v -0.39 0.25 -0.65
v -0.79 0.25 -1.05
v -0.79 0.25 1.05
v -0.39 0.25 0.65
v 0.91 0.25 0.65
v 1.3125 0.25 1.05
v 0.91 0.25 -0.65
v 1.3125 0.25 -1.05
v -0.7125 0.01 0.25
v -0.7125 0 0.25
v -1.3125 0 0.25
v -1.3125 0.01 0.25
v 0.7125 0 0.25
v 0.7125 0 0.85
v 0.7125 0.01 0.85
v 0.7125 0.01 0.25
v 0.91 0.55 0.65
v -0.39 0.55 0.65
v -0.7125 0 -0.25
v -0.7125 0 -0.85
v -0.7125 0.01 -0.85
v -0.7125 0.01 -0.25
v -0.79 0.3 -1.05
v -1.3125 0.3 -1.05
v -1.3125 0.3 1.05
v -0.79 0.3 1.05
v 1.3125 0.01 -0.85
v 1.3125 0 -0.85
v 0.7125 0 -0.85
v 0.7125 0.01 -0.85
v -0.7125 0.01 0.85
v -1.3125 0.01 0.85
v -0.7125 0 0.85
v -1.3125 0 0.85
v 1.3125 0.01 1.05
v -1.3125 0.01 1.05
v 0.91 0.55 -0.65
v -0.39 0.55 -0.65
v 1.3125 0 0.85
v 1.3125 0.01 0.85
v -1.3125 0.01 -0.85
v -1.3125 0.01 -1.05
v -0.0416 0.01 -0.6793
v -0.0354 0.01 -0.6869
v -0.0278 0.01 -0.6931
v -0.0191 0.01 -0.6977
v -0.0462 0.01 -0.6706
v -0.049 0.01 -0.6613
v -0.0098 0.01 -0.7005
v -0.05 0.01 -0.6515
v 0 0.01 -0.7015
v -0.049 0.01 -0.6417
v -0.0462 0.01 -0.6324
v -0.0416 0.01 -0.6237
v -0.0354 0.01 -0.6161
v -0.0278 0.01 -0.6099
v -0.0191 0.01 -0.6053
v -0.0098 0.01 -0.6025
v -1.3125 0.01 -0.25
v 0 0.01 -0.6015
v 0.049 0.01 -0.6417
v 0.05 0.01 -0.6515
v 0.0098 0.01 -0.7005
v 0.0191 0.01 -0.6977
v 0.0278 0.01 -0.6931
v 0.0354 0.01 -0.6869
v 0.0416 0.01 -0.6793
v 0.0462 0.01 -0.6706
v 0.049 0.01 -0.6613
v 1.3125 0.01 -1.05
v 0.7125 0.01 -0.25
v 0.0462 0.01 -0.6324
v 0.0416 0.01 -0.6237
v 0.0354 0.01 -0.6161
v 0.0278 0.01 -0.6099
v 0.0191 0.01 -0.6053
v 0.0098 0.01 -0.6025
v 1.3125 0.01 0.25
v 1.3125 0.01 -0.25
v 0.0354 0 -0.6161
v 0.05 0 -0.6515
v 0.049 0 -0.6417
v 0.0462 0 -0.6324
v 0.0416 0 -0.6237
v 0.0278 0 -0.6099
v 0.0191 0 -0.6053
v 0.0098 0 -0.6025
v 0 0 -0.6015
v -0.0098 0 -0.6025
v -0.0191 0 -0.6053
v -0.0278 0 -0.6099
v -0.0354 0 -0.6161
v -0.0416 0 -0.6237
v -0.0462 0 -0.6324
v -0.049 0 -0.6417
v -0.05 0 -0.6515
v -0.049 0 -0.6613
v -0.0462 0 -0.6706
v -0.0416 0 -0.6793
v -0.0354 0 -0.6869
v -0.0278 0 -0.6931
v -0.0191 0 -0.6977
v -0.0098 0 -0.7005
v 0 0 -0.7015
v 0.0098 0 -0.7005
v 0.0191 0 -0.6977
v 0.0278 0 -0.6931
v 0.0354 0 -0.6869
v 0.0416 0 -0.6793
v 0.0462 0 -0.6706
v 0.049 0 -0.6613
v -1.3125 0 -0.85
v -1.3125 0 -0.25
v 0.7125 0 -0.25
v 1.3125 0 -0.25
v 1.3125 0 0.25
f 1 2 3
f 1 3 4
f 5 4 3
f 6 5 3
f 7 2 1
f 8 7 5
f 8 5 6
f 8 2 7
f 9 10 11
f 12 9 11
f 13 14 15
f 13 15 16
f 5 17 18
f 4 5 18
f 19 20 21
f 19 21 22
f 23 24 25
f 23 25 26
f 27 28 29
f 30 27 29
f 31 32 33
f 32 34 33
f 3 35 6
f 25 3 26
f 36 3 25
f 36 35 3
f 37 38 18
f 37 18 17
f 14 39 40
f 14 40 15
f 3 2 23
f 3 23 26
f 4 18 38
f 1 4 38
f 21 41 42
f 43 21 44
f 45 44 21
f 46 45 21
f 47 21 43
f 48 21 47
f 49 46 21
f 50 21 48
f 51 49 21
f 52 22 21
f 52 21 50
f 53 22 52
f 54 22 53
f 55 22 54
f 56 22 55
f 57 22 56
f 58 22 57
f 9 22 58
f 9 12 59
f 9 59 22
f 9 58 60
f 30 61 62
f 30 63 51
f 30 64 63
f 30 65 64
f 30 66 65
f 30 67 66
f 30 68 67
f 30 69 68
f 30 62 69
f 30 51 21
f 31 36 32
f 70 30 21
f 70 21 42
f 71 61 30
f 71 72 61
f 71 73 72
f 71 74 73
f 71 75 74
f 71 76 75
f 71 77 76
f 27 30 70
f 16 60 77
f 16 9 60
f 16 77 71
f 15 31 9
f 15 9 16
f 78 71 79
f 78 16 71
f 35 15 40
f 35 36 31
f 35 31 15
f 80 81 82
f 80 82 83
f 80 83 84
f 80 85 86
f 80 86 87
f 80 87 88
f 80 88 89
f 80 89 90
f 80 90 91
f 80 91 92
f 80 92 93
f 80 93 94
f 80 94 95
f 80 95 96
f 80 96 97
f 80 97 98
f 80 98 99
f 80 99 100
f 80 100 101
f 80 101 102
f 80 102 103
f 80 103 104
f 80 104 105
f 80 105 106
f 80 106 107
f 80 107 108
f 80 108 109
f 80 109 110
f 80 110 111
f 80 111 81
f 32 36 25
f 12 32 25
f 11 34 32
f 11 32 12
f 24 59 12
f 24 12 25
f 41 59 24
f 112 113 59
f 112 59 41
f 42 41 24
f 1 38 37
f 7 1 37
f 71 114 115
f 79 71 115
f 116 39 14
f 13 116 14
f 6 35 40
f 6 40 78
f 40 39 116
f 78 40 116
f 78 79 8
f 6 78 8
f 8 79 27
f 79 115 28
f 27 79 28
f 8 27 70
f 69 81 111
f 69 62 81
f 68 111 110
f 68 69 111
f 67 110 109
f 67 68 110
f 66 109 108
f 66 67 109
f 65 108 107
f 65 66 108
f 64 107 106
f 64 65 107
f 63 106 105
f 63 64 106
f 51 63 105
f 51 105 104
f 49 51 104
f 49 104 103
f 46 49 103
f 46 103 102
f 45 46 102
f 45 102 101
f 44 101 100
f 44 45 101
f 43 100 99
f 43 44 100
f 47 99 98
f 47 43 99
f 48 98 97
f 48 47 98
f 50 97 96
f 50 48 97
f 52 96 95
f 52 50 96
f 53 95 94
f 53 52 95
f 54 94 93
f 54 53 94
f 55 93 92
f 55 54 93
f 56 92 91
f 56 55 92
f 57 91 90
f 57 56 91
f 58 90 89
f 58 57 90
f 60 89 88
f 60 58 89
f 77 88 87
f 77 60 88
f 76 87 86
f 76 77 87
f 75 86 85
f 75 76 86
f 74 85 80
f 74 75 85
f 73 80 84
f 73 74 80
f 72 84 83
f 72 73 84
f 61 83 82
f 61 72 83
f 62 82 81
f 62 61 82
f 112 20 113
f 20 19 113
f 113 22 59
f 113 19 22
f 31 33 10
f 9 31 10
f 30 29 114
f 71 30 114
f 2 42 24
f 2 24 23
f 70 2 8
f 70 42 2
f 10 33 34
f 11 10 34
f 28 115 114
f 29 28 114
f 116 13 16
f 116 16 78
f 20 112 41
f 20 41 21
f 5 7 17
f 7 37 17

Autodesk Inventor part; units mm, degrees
ref_plane "YZ Plane" through (0, 0, 0) normal (1, 0, 0) x (0, 1, 0)
ref_plane "XZ Plane" through (0, 0, 0) normal (0, 1, 0) x (-1, 0, 0)
ref_plane "XY Plane" through (0, 0, 0) normal (0, 0, 1) x (1, 0, 0)
sketch "Sketch1" plane through (0, 0, 0) normal (0, 1, 0) x (-1, 0, 0)
  line L0 (1.3125, 1.05) -> (-1.3125, 1.05)
  line L1 (-1.3125, 1.05) -> (-1.3125, -1.05)
  line L2 (-1.3125, -1.05) -> (1.3125, -1.05)
  line L3 (1.3125, -1.05) -> (1.3125, 1.05)
  line L4 (1.3125, 1.05) -> (-1.3125, -1.05) construction
  line L5 (-1.3125, 1.05) -> (1.3125, -1.05) construction
  point P0 (0, 0)
  dimension "d0" = 2.625
  dimension "d1" = 2.1
extrude "Extrusion1" add sketch "Sketch1" along normal blind 0.85
sketch "Sketch2" plane through (0, 0.85, 0) normal (0, 1, 0) x (1, 0, 0)
  line L0 (-0.39, -0.65) -> (0.91, -0.65)
  line L1 (0.91, -0.65) -> (0.91, 0.65)
  line L2 (0.91, 0.65) -> (-0.39, 0.65)
  line L3 (-0.39, 0.65) -> (-0.39, -0.65)
  line L4 (-0.39, -0.65) -> (0.91, 0.65) construction
  line L5 (0.91, -0.65) -> (-0.39, 0.65) construction
  line L6 (-1.3125, -1.05) -> (1.3125, -1.05) projected
  line L7 (1.3125, -1.05) -> (1.3125, 1.05) projected
  line L8 (1.3125, 1.05) -> (-1.3125, 1.05) projected
  line L9 (-1.3125, 1.05) -> (-1.3125, -1.05) projected
  point P0 (0, 0)
  point P1 (0.26, 0)
  dimension "d4" = 0.26
  dimension "d5" = 1.3
  dimension "d6" = 1.3
  dimension "d7" = 0
extrude "Extrusion2" cut sketch "Sketch2" against normal blind 0.3 contours L3 L2 L1 L0
sketch "Sketch3" plane through (0, 0.85, 0) normal (0, 1, 0) x (1, 0, 0)
  line L0 (0.91, 0.65) -> (0.91, -0.65) projected
  line L1 (0.91, -0.65) -> (-0.39, -0.65) projected
  line L2 (-0.39, -0.65) -> (-0.39, 0.65) projected
  line L3 (-0.39, 0.65) -> (0.91, 0.65) projected
  line L4 (-1.3125, -1.05) -> (1.3125, -1.05) projected
  line L5 (1.3125, -1.05) -> (1.3125, 1.05) projected
  line L6 (1.3125, 1.05) -> (-1.3125, 1.05) projected
  line L7 (-1.3125, 1.05) -> (-1.3125, -1.05) projected
  point P0 (0, 0)
extrude "Extrusion3" cut sketch "Sketch3" against normal blind 0.6
sketch "Sketch4" plane through (0, 0.25, 0) normal (0, 1, 0) x (1, 0, 0)
  line L0 (0.91, 0.65) -> (-0.39, 0.65) projected
  line L1 (0.91, -0.65) -> (0.91, 0.65) projected
  line L2 (-0.39, -0.65) -> (0.91, -0.65) projected
  line L3 (-0.39, 0.65) -> (-0.39, -0.65) projected
  line L4 (1.3125, -1.05) -> (-1.3125, -1.05) projected
  line L5 (1.3125, 1.05) -> (1.3125, -1.05) projected
  line L6 (-1.3125, 1.05) -> (1.3125, 1.05) projected
  line L7 (-1.3125, -1.05) -> (-1.3125, 1.05) projected
  line L8 (1.3125, 1.05) -> (-1.3125, 1.05) projected
  line L9 (-0.79, 1.05) -> (-0.79, -1.05)
  line L10 (1.3125, -1.05) -> (-1.3125, -1.05) projected
  point P0 (0, 0)
  dimension "d12" = 0.4
extrude "Extrusion4" add sketch "Sketch4" along normal blind 0.05 contours L4 L7 L6 L9
sketch "Sketch5" plane through (0, 0, 0) normal (0, -1, 0) x (1, 0, 0)
  line L0 (-1.3125, 1.05) -> (1.3125, 1.05) projected
  line L1 (-1.3125, -1.05) -> (-1.3125, 1.05) projected
  line L2 (1.3125, -1.05) -> (-1.3125, -1.05) projected
  line L3 (1.3125, 1.05) -> (1.3125, -1.05) projected
  line L4 (1.3125, -1.05) -> (1.3125, 1.05) projected
  line L5 (1.3125, 0.85) -> (0.7125, 0.85)
  line L6 (0.7125, 0.85) -> (0.7125, 0.25)
  line L7 (0.7125, 0.25) -> (1.3125, 0.25)
  line L8 (1.3125, 0.25) -> (1.3125, 0.85)
  line L9 (1.3125, 0) -> (-1.3125, 0) construction
  line L10 (1.3125, 1.05) -> (-0.79, 1.05) projected
  line L11 (0, 1.05) -> (0, -1.05) construction
  line L12 (1.3125, -0.85) -> (0.7125, -0.85)
  line L13 (0.7125, -0.85) -> (0.7125, -0.25)
  line L14 (0.7125, -0.25) -> (1.3125, -0.25)
  line L15 (1.3125, -0.25) -> (1.3125, -0.85)
  line L16 (-1.3125, 1.05) -> (-1.3125, -1.05)
  line L17 (-1.3125, -1.05) -> (-1.3125, 1.05)
  line L18 (-1.3125, 0.85) -> (-0.7125, 0.85)
  line L19 (-0.7125, 0.85) -> (-0.7125, 0.25)
  line L20 (-0.7125, 0.25) -> (-1.3125, 0.25)
  line L21 (-1.3125, 0.25) -> (-1.3125, 0.85)
  line L22 (-1.3125, -0.85) -> (-0.7125, -0.85)
  line L23 (-0.7125, -0.85) -> (-0.7125, -0.25)
  line L24 (-0.7125, -0.25) -> (-1.3125, -0.25)
  line L25 (-1.3125, -0.25) -> (-1.3125, -0.85)
  point P0 (0, 0)
  dimension "d15" = 0.25
  dimension "d16" = 0.6
  dimension "d17" = 0.6
extrude "Extrusion5" cut sketch "Sketch5" against normal blind 0.01 contours L0 L3 L5 L6 L7 L14 L13 L12 L2 L1 L22 L23 L24 L20 L19 L18
sketch "Sketch6" plane through (0, 0.01, 0) normal (0, -1, 0) x (1, 0, 0)
  circle A0 centre (0, -0.6515) radius 0.05
  point P0 (0, 0)
  dimension "d20" = 0.1
extrude "Extrusion6" add sketch "Sketch6" along normal up to surface (0.01 mm away)
properties part number "mppc" material "ABS Plastic"
